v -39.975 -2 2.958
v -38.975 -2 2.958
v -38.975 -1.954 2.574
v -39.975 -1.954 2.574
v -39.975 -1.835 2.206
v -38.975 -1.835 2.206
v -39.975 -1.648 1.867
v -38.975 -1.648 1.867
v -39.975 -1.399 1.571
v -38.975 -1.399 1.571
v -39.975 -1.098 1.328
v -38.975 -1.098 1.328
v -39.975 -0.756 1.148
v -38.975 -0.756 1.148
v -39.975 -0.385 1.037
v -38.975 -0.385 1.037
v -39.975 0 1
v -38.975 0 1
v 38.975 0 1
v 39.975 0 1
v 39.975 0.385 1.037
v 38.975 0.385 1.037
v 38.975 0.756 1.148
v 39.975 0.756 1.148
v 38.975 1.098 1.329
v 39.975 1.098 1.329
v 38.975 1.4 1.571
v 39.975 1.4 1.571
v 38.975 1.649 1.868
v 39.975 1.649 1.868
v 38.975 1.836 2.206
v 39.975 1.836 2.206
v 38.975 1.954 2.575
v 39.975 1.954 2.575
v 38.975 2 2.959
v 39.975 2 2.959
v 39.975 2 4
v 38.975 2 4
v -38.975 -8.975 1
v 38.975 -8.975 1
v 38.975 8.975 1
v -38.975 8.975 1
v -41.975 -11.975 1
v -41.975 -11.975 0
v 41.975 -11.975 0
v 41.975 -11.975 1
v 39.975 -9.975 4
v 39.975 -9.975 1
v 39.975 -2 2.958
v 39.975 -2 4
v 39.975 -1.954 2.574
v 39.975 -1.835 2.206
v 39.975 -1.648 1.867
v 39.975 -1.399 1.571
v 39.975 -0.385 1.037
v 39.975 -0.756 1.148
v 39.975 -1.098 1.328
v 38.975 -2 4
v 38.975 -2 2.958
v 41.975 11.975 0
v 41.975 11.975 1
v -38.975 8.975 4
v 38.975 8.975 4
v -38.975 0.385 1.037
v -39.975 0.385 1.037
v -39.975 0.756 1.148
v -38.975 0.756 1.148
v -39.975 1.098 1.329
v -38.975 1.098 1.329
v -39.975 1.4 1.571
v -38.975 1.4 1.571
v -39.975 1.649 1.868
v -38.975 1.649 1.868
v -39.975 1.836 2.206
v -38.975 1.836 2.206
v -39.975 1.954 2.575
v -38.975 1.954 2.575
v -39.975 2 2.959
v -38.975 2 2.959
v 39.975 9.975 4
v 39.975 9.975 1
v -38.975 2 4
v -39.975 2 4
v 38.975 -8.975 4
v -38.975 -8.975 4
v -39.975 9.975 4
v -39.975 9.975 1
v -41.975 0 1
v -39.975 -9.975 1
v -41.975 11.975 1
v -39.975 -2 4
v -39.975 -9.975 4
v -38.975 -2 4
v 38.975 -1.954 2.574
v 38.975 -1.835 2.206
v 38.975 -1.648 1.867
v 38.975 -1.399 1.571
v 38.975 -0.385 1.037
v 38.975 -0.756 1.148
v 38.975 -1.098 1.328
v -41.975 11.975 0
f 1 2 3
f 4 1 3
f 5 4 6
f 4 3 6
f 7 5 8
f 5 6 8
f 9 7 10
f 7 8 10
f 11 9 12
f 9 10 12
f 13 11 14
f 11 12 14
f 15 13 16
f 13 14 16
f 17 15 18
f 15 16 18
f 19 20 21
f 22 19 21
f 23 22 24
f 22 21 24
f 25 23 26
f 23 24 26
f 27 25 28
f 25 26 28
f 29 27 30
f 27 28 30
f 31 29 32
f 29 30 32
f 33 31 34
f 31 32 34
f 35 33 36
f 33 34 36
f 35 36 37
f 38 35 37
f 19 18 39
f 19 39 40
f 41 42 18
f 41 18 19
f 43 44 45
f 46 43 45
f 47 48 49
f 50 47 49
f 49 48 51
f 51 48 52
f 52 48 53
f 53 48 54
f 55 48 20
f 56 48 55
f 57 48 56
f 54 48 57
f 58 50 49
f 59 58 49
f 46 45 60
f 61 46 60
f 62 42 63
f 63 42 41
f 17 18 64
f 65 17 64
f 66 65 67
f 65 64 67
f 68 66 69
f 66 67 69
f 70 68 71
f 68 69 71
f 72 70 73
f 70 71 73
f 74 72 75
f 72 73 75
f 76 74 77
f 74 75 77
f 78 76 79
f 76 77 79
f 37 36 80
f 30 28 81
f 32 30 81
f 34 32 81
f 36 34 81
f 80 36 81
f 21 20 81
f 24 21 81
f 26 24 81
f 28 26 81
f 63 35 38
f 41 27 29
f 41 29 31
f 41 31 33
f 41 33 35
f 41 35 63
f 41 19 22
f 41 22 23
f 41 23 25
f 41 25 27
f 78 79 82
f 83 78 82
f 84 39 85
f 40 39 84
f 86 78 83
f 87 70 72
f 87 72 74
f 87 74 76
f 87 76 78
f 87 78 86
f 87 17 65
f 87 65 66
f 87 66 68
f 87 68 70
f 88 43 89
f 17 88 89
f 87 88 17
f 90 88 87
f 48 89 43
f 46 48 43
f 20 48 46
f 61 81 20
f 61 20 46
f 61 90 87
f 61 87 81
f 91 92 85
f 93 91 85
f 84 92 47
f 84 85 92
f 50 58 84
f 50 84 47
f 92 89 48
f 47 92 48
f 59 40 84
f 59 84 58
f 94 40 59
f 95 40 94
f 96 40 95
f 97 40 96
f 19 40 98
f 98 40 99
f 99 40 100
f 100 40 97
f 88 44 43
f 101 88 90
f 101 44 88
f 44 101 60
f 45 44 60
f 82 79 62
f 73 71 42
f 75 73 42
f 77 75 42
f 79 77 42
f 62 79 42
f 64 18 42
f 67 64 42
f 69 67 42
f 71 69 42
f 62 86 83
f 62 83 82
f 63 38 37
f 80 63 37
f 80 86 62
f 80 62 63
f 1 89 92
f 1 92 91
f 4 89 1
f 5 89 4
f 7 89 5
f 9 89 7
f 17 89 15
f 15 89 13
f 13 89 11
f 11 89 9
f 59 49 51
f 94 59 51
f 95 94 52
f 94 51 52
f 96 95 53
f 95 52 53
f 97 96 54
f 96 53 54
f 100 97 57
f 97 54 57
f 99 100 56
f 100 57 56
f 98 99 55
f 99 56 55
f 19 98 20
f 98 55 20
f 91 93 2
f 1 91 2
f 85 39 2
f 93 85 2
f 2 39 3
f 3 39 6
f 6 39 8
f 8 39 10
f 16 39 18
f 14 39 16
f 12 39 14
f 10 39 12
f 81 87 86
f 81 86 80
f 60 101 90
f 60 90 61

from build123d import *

# Parameters (mm, degrees)
F0_W     = 79.95
F0_H     = 19.95
F0_W_2   = 77.95
F0_H_2   = 17.95
F1_DEPTH = 4
F0_W_3   = 83.95
F0_H_3   = 23.95
F2_DEPTH = 1
F4_DEPTH = 100


with BuildPart() as f1:
    # F0 (on Top) → F1 (new body)
    with BuildSketch(Plane.XY):
        Rectangle(F0_W, F0_H)
        Rectangle(F0_W_2, F0_H_2, mode=Mode.SUBTRACT)
    extrude(amount=F1_DEPTH)

    # F0 (on Top) → F2 (join)
    with BuildSketch(Plane.XY):
        Rectangle(F0_W_3, F0_H_3)
        Rectangle(F0_W, F0_H, mode=Mode.SUBTRACT)
        Rectangle(F0_W_2, F0_H_2)
    extrude(amount=F2_DEPTH)

    # F3 (on face) → F4 (cut)
    with BuildSketch(Plane.YZ.offset(39.975)):
        with BuildLine():
            Line((-1.999556, 4), (-1.999556, 3.04214))
            Line((-1.999556, 3.04214), (-1.999556, 2.95786))
            ThreePointArc((-1.999556, 2.95786), (-1.399236, 1.570965), (0, 1))
            ThreePointArc((0, 1), (1.39965, 1.571372), (1.99958, 2.959021))
            Line((1.99958, 2.959021), (1.99958, 3.040979))
            Line((1.99958, 3.040979), (1.99958, 4))
            Line((1.99958, 4), (-1.999556, 4))
        make_face()
    extrude(amount=-F4_DEPTH, mode=Mode.SUBTRACT)


solid = f1.part
